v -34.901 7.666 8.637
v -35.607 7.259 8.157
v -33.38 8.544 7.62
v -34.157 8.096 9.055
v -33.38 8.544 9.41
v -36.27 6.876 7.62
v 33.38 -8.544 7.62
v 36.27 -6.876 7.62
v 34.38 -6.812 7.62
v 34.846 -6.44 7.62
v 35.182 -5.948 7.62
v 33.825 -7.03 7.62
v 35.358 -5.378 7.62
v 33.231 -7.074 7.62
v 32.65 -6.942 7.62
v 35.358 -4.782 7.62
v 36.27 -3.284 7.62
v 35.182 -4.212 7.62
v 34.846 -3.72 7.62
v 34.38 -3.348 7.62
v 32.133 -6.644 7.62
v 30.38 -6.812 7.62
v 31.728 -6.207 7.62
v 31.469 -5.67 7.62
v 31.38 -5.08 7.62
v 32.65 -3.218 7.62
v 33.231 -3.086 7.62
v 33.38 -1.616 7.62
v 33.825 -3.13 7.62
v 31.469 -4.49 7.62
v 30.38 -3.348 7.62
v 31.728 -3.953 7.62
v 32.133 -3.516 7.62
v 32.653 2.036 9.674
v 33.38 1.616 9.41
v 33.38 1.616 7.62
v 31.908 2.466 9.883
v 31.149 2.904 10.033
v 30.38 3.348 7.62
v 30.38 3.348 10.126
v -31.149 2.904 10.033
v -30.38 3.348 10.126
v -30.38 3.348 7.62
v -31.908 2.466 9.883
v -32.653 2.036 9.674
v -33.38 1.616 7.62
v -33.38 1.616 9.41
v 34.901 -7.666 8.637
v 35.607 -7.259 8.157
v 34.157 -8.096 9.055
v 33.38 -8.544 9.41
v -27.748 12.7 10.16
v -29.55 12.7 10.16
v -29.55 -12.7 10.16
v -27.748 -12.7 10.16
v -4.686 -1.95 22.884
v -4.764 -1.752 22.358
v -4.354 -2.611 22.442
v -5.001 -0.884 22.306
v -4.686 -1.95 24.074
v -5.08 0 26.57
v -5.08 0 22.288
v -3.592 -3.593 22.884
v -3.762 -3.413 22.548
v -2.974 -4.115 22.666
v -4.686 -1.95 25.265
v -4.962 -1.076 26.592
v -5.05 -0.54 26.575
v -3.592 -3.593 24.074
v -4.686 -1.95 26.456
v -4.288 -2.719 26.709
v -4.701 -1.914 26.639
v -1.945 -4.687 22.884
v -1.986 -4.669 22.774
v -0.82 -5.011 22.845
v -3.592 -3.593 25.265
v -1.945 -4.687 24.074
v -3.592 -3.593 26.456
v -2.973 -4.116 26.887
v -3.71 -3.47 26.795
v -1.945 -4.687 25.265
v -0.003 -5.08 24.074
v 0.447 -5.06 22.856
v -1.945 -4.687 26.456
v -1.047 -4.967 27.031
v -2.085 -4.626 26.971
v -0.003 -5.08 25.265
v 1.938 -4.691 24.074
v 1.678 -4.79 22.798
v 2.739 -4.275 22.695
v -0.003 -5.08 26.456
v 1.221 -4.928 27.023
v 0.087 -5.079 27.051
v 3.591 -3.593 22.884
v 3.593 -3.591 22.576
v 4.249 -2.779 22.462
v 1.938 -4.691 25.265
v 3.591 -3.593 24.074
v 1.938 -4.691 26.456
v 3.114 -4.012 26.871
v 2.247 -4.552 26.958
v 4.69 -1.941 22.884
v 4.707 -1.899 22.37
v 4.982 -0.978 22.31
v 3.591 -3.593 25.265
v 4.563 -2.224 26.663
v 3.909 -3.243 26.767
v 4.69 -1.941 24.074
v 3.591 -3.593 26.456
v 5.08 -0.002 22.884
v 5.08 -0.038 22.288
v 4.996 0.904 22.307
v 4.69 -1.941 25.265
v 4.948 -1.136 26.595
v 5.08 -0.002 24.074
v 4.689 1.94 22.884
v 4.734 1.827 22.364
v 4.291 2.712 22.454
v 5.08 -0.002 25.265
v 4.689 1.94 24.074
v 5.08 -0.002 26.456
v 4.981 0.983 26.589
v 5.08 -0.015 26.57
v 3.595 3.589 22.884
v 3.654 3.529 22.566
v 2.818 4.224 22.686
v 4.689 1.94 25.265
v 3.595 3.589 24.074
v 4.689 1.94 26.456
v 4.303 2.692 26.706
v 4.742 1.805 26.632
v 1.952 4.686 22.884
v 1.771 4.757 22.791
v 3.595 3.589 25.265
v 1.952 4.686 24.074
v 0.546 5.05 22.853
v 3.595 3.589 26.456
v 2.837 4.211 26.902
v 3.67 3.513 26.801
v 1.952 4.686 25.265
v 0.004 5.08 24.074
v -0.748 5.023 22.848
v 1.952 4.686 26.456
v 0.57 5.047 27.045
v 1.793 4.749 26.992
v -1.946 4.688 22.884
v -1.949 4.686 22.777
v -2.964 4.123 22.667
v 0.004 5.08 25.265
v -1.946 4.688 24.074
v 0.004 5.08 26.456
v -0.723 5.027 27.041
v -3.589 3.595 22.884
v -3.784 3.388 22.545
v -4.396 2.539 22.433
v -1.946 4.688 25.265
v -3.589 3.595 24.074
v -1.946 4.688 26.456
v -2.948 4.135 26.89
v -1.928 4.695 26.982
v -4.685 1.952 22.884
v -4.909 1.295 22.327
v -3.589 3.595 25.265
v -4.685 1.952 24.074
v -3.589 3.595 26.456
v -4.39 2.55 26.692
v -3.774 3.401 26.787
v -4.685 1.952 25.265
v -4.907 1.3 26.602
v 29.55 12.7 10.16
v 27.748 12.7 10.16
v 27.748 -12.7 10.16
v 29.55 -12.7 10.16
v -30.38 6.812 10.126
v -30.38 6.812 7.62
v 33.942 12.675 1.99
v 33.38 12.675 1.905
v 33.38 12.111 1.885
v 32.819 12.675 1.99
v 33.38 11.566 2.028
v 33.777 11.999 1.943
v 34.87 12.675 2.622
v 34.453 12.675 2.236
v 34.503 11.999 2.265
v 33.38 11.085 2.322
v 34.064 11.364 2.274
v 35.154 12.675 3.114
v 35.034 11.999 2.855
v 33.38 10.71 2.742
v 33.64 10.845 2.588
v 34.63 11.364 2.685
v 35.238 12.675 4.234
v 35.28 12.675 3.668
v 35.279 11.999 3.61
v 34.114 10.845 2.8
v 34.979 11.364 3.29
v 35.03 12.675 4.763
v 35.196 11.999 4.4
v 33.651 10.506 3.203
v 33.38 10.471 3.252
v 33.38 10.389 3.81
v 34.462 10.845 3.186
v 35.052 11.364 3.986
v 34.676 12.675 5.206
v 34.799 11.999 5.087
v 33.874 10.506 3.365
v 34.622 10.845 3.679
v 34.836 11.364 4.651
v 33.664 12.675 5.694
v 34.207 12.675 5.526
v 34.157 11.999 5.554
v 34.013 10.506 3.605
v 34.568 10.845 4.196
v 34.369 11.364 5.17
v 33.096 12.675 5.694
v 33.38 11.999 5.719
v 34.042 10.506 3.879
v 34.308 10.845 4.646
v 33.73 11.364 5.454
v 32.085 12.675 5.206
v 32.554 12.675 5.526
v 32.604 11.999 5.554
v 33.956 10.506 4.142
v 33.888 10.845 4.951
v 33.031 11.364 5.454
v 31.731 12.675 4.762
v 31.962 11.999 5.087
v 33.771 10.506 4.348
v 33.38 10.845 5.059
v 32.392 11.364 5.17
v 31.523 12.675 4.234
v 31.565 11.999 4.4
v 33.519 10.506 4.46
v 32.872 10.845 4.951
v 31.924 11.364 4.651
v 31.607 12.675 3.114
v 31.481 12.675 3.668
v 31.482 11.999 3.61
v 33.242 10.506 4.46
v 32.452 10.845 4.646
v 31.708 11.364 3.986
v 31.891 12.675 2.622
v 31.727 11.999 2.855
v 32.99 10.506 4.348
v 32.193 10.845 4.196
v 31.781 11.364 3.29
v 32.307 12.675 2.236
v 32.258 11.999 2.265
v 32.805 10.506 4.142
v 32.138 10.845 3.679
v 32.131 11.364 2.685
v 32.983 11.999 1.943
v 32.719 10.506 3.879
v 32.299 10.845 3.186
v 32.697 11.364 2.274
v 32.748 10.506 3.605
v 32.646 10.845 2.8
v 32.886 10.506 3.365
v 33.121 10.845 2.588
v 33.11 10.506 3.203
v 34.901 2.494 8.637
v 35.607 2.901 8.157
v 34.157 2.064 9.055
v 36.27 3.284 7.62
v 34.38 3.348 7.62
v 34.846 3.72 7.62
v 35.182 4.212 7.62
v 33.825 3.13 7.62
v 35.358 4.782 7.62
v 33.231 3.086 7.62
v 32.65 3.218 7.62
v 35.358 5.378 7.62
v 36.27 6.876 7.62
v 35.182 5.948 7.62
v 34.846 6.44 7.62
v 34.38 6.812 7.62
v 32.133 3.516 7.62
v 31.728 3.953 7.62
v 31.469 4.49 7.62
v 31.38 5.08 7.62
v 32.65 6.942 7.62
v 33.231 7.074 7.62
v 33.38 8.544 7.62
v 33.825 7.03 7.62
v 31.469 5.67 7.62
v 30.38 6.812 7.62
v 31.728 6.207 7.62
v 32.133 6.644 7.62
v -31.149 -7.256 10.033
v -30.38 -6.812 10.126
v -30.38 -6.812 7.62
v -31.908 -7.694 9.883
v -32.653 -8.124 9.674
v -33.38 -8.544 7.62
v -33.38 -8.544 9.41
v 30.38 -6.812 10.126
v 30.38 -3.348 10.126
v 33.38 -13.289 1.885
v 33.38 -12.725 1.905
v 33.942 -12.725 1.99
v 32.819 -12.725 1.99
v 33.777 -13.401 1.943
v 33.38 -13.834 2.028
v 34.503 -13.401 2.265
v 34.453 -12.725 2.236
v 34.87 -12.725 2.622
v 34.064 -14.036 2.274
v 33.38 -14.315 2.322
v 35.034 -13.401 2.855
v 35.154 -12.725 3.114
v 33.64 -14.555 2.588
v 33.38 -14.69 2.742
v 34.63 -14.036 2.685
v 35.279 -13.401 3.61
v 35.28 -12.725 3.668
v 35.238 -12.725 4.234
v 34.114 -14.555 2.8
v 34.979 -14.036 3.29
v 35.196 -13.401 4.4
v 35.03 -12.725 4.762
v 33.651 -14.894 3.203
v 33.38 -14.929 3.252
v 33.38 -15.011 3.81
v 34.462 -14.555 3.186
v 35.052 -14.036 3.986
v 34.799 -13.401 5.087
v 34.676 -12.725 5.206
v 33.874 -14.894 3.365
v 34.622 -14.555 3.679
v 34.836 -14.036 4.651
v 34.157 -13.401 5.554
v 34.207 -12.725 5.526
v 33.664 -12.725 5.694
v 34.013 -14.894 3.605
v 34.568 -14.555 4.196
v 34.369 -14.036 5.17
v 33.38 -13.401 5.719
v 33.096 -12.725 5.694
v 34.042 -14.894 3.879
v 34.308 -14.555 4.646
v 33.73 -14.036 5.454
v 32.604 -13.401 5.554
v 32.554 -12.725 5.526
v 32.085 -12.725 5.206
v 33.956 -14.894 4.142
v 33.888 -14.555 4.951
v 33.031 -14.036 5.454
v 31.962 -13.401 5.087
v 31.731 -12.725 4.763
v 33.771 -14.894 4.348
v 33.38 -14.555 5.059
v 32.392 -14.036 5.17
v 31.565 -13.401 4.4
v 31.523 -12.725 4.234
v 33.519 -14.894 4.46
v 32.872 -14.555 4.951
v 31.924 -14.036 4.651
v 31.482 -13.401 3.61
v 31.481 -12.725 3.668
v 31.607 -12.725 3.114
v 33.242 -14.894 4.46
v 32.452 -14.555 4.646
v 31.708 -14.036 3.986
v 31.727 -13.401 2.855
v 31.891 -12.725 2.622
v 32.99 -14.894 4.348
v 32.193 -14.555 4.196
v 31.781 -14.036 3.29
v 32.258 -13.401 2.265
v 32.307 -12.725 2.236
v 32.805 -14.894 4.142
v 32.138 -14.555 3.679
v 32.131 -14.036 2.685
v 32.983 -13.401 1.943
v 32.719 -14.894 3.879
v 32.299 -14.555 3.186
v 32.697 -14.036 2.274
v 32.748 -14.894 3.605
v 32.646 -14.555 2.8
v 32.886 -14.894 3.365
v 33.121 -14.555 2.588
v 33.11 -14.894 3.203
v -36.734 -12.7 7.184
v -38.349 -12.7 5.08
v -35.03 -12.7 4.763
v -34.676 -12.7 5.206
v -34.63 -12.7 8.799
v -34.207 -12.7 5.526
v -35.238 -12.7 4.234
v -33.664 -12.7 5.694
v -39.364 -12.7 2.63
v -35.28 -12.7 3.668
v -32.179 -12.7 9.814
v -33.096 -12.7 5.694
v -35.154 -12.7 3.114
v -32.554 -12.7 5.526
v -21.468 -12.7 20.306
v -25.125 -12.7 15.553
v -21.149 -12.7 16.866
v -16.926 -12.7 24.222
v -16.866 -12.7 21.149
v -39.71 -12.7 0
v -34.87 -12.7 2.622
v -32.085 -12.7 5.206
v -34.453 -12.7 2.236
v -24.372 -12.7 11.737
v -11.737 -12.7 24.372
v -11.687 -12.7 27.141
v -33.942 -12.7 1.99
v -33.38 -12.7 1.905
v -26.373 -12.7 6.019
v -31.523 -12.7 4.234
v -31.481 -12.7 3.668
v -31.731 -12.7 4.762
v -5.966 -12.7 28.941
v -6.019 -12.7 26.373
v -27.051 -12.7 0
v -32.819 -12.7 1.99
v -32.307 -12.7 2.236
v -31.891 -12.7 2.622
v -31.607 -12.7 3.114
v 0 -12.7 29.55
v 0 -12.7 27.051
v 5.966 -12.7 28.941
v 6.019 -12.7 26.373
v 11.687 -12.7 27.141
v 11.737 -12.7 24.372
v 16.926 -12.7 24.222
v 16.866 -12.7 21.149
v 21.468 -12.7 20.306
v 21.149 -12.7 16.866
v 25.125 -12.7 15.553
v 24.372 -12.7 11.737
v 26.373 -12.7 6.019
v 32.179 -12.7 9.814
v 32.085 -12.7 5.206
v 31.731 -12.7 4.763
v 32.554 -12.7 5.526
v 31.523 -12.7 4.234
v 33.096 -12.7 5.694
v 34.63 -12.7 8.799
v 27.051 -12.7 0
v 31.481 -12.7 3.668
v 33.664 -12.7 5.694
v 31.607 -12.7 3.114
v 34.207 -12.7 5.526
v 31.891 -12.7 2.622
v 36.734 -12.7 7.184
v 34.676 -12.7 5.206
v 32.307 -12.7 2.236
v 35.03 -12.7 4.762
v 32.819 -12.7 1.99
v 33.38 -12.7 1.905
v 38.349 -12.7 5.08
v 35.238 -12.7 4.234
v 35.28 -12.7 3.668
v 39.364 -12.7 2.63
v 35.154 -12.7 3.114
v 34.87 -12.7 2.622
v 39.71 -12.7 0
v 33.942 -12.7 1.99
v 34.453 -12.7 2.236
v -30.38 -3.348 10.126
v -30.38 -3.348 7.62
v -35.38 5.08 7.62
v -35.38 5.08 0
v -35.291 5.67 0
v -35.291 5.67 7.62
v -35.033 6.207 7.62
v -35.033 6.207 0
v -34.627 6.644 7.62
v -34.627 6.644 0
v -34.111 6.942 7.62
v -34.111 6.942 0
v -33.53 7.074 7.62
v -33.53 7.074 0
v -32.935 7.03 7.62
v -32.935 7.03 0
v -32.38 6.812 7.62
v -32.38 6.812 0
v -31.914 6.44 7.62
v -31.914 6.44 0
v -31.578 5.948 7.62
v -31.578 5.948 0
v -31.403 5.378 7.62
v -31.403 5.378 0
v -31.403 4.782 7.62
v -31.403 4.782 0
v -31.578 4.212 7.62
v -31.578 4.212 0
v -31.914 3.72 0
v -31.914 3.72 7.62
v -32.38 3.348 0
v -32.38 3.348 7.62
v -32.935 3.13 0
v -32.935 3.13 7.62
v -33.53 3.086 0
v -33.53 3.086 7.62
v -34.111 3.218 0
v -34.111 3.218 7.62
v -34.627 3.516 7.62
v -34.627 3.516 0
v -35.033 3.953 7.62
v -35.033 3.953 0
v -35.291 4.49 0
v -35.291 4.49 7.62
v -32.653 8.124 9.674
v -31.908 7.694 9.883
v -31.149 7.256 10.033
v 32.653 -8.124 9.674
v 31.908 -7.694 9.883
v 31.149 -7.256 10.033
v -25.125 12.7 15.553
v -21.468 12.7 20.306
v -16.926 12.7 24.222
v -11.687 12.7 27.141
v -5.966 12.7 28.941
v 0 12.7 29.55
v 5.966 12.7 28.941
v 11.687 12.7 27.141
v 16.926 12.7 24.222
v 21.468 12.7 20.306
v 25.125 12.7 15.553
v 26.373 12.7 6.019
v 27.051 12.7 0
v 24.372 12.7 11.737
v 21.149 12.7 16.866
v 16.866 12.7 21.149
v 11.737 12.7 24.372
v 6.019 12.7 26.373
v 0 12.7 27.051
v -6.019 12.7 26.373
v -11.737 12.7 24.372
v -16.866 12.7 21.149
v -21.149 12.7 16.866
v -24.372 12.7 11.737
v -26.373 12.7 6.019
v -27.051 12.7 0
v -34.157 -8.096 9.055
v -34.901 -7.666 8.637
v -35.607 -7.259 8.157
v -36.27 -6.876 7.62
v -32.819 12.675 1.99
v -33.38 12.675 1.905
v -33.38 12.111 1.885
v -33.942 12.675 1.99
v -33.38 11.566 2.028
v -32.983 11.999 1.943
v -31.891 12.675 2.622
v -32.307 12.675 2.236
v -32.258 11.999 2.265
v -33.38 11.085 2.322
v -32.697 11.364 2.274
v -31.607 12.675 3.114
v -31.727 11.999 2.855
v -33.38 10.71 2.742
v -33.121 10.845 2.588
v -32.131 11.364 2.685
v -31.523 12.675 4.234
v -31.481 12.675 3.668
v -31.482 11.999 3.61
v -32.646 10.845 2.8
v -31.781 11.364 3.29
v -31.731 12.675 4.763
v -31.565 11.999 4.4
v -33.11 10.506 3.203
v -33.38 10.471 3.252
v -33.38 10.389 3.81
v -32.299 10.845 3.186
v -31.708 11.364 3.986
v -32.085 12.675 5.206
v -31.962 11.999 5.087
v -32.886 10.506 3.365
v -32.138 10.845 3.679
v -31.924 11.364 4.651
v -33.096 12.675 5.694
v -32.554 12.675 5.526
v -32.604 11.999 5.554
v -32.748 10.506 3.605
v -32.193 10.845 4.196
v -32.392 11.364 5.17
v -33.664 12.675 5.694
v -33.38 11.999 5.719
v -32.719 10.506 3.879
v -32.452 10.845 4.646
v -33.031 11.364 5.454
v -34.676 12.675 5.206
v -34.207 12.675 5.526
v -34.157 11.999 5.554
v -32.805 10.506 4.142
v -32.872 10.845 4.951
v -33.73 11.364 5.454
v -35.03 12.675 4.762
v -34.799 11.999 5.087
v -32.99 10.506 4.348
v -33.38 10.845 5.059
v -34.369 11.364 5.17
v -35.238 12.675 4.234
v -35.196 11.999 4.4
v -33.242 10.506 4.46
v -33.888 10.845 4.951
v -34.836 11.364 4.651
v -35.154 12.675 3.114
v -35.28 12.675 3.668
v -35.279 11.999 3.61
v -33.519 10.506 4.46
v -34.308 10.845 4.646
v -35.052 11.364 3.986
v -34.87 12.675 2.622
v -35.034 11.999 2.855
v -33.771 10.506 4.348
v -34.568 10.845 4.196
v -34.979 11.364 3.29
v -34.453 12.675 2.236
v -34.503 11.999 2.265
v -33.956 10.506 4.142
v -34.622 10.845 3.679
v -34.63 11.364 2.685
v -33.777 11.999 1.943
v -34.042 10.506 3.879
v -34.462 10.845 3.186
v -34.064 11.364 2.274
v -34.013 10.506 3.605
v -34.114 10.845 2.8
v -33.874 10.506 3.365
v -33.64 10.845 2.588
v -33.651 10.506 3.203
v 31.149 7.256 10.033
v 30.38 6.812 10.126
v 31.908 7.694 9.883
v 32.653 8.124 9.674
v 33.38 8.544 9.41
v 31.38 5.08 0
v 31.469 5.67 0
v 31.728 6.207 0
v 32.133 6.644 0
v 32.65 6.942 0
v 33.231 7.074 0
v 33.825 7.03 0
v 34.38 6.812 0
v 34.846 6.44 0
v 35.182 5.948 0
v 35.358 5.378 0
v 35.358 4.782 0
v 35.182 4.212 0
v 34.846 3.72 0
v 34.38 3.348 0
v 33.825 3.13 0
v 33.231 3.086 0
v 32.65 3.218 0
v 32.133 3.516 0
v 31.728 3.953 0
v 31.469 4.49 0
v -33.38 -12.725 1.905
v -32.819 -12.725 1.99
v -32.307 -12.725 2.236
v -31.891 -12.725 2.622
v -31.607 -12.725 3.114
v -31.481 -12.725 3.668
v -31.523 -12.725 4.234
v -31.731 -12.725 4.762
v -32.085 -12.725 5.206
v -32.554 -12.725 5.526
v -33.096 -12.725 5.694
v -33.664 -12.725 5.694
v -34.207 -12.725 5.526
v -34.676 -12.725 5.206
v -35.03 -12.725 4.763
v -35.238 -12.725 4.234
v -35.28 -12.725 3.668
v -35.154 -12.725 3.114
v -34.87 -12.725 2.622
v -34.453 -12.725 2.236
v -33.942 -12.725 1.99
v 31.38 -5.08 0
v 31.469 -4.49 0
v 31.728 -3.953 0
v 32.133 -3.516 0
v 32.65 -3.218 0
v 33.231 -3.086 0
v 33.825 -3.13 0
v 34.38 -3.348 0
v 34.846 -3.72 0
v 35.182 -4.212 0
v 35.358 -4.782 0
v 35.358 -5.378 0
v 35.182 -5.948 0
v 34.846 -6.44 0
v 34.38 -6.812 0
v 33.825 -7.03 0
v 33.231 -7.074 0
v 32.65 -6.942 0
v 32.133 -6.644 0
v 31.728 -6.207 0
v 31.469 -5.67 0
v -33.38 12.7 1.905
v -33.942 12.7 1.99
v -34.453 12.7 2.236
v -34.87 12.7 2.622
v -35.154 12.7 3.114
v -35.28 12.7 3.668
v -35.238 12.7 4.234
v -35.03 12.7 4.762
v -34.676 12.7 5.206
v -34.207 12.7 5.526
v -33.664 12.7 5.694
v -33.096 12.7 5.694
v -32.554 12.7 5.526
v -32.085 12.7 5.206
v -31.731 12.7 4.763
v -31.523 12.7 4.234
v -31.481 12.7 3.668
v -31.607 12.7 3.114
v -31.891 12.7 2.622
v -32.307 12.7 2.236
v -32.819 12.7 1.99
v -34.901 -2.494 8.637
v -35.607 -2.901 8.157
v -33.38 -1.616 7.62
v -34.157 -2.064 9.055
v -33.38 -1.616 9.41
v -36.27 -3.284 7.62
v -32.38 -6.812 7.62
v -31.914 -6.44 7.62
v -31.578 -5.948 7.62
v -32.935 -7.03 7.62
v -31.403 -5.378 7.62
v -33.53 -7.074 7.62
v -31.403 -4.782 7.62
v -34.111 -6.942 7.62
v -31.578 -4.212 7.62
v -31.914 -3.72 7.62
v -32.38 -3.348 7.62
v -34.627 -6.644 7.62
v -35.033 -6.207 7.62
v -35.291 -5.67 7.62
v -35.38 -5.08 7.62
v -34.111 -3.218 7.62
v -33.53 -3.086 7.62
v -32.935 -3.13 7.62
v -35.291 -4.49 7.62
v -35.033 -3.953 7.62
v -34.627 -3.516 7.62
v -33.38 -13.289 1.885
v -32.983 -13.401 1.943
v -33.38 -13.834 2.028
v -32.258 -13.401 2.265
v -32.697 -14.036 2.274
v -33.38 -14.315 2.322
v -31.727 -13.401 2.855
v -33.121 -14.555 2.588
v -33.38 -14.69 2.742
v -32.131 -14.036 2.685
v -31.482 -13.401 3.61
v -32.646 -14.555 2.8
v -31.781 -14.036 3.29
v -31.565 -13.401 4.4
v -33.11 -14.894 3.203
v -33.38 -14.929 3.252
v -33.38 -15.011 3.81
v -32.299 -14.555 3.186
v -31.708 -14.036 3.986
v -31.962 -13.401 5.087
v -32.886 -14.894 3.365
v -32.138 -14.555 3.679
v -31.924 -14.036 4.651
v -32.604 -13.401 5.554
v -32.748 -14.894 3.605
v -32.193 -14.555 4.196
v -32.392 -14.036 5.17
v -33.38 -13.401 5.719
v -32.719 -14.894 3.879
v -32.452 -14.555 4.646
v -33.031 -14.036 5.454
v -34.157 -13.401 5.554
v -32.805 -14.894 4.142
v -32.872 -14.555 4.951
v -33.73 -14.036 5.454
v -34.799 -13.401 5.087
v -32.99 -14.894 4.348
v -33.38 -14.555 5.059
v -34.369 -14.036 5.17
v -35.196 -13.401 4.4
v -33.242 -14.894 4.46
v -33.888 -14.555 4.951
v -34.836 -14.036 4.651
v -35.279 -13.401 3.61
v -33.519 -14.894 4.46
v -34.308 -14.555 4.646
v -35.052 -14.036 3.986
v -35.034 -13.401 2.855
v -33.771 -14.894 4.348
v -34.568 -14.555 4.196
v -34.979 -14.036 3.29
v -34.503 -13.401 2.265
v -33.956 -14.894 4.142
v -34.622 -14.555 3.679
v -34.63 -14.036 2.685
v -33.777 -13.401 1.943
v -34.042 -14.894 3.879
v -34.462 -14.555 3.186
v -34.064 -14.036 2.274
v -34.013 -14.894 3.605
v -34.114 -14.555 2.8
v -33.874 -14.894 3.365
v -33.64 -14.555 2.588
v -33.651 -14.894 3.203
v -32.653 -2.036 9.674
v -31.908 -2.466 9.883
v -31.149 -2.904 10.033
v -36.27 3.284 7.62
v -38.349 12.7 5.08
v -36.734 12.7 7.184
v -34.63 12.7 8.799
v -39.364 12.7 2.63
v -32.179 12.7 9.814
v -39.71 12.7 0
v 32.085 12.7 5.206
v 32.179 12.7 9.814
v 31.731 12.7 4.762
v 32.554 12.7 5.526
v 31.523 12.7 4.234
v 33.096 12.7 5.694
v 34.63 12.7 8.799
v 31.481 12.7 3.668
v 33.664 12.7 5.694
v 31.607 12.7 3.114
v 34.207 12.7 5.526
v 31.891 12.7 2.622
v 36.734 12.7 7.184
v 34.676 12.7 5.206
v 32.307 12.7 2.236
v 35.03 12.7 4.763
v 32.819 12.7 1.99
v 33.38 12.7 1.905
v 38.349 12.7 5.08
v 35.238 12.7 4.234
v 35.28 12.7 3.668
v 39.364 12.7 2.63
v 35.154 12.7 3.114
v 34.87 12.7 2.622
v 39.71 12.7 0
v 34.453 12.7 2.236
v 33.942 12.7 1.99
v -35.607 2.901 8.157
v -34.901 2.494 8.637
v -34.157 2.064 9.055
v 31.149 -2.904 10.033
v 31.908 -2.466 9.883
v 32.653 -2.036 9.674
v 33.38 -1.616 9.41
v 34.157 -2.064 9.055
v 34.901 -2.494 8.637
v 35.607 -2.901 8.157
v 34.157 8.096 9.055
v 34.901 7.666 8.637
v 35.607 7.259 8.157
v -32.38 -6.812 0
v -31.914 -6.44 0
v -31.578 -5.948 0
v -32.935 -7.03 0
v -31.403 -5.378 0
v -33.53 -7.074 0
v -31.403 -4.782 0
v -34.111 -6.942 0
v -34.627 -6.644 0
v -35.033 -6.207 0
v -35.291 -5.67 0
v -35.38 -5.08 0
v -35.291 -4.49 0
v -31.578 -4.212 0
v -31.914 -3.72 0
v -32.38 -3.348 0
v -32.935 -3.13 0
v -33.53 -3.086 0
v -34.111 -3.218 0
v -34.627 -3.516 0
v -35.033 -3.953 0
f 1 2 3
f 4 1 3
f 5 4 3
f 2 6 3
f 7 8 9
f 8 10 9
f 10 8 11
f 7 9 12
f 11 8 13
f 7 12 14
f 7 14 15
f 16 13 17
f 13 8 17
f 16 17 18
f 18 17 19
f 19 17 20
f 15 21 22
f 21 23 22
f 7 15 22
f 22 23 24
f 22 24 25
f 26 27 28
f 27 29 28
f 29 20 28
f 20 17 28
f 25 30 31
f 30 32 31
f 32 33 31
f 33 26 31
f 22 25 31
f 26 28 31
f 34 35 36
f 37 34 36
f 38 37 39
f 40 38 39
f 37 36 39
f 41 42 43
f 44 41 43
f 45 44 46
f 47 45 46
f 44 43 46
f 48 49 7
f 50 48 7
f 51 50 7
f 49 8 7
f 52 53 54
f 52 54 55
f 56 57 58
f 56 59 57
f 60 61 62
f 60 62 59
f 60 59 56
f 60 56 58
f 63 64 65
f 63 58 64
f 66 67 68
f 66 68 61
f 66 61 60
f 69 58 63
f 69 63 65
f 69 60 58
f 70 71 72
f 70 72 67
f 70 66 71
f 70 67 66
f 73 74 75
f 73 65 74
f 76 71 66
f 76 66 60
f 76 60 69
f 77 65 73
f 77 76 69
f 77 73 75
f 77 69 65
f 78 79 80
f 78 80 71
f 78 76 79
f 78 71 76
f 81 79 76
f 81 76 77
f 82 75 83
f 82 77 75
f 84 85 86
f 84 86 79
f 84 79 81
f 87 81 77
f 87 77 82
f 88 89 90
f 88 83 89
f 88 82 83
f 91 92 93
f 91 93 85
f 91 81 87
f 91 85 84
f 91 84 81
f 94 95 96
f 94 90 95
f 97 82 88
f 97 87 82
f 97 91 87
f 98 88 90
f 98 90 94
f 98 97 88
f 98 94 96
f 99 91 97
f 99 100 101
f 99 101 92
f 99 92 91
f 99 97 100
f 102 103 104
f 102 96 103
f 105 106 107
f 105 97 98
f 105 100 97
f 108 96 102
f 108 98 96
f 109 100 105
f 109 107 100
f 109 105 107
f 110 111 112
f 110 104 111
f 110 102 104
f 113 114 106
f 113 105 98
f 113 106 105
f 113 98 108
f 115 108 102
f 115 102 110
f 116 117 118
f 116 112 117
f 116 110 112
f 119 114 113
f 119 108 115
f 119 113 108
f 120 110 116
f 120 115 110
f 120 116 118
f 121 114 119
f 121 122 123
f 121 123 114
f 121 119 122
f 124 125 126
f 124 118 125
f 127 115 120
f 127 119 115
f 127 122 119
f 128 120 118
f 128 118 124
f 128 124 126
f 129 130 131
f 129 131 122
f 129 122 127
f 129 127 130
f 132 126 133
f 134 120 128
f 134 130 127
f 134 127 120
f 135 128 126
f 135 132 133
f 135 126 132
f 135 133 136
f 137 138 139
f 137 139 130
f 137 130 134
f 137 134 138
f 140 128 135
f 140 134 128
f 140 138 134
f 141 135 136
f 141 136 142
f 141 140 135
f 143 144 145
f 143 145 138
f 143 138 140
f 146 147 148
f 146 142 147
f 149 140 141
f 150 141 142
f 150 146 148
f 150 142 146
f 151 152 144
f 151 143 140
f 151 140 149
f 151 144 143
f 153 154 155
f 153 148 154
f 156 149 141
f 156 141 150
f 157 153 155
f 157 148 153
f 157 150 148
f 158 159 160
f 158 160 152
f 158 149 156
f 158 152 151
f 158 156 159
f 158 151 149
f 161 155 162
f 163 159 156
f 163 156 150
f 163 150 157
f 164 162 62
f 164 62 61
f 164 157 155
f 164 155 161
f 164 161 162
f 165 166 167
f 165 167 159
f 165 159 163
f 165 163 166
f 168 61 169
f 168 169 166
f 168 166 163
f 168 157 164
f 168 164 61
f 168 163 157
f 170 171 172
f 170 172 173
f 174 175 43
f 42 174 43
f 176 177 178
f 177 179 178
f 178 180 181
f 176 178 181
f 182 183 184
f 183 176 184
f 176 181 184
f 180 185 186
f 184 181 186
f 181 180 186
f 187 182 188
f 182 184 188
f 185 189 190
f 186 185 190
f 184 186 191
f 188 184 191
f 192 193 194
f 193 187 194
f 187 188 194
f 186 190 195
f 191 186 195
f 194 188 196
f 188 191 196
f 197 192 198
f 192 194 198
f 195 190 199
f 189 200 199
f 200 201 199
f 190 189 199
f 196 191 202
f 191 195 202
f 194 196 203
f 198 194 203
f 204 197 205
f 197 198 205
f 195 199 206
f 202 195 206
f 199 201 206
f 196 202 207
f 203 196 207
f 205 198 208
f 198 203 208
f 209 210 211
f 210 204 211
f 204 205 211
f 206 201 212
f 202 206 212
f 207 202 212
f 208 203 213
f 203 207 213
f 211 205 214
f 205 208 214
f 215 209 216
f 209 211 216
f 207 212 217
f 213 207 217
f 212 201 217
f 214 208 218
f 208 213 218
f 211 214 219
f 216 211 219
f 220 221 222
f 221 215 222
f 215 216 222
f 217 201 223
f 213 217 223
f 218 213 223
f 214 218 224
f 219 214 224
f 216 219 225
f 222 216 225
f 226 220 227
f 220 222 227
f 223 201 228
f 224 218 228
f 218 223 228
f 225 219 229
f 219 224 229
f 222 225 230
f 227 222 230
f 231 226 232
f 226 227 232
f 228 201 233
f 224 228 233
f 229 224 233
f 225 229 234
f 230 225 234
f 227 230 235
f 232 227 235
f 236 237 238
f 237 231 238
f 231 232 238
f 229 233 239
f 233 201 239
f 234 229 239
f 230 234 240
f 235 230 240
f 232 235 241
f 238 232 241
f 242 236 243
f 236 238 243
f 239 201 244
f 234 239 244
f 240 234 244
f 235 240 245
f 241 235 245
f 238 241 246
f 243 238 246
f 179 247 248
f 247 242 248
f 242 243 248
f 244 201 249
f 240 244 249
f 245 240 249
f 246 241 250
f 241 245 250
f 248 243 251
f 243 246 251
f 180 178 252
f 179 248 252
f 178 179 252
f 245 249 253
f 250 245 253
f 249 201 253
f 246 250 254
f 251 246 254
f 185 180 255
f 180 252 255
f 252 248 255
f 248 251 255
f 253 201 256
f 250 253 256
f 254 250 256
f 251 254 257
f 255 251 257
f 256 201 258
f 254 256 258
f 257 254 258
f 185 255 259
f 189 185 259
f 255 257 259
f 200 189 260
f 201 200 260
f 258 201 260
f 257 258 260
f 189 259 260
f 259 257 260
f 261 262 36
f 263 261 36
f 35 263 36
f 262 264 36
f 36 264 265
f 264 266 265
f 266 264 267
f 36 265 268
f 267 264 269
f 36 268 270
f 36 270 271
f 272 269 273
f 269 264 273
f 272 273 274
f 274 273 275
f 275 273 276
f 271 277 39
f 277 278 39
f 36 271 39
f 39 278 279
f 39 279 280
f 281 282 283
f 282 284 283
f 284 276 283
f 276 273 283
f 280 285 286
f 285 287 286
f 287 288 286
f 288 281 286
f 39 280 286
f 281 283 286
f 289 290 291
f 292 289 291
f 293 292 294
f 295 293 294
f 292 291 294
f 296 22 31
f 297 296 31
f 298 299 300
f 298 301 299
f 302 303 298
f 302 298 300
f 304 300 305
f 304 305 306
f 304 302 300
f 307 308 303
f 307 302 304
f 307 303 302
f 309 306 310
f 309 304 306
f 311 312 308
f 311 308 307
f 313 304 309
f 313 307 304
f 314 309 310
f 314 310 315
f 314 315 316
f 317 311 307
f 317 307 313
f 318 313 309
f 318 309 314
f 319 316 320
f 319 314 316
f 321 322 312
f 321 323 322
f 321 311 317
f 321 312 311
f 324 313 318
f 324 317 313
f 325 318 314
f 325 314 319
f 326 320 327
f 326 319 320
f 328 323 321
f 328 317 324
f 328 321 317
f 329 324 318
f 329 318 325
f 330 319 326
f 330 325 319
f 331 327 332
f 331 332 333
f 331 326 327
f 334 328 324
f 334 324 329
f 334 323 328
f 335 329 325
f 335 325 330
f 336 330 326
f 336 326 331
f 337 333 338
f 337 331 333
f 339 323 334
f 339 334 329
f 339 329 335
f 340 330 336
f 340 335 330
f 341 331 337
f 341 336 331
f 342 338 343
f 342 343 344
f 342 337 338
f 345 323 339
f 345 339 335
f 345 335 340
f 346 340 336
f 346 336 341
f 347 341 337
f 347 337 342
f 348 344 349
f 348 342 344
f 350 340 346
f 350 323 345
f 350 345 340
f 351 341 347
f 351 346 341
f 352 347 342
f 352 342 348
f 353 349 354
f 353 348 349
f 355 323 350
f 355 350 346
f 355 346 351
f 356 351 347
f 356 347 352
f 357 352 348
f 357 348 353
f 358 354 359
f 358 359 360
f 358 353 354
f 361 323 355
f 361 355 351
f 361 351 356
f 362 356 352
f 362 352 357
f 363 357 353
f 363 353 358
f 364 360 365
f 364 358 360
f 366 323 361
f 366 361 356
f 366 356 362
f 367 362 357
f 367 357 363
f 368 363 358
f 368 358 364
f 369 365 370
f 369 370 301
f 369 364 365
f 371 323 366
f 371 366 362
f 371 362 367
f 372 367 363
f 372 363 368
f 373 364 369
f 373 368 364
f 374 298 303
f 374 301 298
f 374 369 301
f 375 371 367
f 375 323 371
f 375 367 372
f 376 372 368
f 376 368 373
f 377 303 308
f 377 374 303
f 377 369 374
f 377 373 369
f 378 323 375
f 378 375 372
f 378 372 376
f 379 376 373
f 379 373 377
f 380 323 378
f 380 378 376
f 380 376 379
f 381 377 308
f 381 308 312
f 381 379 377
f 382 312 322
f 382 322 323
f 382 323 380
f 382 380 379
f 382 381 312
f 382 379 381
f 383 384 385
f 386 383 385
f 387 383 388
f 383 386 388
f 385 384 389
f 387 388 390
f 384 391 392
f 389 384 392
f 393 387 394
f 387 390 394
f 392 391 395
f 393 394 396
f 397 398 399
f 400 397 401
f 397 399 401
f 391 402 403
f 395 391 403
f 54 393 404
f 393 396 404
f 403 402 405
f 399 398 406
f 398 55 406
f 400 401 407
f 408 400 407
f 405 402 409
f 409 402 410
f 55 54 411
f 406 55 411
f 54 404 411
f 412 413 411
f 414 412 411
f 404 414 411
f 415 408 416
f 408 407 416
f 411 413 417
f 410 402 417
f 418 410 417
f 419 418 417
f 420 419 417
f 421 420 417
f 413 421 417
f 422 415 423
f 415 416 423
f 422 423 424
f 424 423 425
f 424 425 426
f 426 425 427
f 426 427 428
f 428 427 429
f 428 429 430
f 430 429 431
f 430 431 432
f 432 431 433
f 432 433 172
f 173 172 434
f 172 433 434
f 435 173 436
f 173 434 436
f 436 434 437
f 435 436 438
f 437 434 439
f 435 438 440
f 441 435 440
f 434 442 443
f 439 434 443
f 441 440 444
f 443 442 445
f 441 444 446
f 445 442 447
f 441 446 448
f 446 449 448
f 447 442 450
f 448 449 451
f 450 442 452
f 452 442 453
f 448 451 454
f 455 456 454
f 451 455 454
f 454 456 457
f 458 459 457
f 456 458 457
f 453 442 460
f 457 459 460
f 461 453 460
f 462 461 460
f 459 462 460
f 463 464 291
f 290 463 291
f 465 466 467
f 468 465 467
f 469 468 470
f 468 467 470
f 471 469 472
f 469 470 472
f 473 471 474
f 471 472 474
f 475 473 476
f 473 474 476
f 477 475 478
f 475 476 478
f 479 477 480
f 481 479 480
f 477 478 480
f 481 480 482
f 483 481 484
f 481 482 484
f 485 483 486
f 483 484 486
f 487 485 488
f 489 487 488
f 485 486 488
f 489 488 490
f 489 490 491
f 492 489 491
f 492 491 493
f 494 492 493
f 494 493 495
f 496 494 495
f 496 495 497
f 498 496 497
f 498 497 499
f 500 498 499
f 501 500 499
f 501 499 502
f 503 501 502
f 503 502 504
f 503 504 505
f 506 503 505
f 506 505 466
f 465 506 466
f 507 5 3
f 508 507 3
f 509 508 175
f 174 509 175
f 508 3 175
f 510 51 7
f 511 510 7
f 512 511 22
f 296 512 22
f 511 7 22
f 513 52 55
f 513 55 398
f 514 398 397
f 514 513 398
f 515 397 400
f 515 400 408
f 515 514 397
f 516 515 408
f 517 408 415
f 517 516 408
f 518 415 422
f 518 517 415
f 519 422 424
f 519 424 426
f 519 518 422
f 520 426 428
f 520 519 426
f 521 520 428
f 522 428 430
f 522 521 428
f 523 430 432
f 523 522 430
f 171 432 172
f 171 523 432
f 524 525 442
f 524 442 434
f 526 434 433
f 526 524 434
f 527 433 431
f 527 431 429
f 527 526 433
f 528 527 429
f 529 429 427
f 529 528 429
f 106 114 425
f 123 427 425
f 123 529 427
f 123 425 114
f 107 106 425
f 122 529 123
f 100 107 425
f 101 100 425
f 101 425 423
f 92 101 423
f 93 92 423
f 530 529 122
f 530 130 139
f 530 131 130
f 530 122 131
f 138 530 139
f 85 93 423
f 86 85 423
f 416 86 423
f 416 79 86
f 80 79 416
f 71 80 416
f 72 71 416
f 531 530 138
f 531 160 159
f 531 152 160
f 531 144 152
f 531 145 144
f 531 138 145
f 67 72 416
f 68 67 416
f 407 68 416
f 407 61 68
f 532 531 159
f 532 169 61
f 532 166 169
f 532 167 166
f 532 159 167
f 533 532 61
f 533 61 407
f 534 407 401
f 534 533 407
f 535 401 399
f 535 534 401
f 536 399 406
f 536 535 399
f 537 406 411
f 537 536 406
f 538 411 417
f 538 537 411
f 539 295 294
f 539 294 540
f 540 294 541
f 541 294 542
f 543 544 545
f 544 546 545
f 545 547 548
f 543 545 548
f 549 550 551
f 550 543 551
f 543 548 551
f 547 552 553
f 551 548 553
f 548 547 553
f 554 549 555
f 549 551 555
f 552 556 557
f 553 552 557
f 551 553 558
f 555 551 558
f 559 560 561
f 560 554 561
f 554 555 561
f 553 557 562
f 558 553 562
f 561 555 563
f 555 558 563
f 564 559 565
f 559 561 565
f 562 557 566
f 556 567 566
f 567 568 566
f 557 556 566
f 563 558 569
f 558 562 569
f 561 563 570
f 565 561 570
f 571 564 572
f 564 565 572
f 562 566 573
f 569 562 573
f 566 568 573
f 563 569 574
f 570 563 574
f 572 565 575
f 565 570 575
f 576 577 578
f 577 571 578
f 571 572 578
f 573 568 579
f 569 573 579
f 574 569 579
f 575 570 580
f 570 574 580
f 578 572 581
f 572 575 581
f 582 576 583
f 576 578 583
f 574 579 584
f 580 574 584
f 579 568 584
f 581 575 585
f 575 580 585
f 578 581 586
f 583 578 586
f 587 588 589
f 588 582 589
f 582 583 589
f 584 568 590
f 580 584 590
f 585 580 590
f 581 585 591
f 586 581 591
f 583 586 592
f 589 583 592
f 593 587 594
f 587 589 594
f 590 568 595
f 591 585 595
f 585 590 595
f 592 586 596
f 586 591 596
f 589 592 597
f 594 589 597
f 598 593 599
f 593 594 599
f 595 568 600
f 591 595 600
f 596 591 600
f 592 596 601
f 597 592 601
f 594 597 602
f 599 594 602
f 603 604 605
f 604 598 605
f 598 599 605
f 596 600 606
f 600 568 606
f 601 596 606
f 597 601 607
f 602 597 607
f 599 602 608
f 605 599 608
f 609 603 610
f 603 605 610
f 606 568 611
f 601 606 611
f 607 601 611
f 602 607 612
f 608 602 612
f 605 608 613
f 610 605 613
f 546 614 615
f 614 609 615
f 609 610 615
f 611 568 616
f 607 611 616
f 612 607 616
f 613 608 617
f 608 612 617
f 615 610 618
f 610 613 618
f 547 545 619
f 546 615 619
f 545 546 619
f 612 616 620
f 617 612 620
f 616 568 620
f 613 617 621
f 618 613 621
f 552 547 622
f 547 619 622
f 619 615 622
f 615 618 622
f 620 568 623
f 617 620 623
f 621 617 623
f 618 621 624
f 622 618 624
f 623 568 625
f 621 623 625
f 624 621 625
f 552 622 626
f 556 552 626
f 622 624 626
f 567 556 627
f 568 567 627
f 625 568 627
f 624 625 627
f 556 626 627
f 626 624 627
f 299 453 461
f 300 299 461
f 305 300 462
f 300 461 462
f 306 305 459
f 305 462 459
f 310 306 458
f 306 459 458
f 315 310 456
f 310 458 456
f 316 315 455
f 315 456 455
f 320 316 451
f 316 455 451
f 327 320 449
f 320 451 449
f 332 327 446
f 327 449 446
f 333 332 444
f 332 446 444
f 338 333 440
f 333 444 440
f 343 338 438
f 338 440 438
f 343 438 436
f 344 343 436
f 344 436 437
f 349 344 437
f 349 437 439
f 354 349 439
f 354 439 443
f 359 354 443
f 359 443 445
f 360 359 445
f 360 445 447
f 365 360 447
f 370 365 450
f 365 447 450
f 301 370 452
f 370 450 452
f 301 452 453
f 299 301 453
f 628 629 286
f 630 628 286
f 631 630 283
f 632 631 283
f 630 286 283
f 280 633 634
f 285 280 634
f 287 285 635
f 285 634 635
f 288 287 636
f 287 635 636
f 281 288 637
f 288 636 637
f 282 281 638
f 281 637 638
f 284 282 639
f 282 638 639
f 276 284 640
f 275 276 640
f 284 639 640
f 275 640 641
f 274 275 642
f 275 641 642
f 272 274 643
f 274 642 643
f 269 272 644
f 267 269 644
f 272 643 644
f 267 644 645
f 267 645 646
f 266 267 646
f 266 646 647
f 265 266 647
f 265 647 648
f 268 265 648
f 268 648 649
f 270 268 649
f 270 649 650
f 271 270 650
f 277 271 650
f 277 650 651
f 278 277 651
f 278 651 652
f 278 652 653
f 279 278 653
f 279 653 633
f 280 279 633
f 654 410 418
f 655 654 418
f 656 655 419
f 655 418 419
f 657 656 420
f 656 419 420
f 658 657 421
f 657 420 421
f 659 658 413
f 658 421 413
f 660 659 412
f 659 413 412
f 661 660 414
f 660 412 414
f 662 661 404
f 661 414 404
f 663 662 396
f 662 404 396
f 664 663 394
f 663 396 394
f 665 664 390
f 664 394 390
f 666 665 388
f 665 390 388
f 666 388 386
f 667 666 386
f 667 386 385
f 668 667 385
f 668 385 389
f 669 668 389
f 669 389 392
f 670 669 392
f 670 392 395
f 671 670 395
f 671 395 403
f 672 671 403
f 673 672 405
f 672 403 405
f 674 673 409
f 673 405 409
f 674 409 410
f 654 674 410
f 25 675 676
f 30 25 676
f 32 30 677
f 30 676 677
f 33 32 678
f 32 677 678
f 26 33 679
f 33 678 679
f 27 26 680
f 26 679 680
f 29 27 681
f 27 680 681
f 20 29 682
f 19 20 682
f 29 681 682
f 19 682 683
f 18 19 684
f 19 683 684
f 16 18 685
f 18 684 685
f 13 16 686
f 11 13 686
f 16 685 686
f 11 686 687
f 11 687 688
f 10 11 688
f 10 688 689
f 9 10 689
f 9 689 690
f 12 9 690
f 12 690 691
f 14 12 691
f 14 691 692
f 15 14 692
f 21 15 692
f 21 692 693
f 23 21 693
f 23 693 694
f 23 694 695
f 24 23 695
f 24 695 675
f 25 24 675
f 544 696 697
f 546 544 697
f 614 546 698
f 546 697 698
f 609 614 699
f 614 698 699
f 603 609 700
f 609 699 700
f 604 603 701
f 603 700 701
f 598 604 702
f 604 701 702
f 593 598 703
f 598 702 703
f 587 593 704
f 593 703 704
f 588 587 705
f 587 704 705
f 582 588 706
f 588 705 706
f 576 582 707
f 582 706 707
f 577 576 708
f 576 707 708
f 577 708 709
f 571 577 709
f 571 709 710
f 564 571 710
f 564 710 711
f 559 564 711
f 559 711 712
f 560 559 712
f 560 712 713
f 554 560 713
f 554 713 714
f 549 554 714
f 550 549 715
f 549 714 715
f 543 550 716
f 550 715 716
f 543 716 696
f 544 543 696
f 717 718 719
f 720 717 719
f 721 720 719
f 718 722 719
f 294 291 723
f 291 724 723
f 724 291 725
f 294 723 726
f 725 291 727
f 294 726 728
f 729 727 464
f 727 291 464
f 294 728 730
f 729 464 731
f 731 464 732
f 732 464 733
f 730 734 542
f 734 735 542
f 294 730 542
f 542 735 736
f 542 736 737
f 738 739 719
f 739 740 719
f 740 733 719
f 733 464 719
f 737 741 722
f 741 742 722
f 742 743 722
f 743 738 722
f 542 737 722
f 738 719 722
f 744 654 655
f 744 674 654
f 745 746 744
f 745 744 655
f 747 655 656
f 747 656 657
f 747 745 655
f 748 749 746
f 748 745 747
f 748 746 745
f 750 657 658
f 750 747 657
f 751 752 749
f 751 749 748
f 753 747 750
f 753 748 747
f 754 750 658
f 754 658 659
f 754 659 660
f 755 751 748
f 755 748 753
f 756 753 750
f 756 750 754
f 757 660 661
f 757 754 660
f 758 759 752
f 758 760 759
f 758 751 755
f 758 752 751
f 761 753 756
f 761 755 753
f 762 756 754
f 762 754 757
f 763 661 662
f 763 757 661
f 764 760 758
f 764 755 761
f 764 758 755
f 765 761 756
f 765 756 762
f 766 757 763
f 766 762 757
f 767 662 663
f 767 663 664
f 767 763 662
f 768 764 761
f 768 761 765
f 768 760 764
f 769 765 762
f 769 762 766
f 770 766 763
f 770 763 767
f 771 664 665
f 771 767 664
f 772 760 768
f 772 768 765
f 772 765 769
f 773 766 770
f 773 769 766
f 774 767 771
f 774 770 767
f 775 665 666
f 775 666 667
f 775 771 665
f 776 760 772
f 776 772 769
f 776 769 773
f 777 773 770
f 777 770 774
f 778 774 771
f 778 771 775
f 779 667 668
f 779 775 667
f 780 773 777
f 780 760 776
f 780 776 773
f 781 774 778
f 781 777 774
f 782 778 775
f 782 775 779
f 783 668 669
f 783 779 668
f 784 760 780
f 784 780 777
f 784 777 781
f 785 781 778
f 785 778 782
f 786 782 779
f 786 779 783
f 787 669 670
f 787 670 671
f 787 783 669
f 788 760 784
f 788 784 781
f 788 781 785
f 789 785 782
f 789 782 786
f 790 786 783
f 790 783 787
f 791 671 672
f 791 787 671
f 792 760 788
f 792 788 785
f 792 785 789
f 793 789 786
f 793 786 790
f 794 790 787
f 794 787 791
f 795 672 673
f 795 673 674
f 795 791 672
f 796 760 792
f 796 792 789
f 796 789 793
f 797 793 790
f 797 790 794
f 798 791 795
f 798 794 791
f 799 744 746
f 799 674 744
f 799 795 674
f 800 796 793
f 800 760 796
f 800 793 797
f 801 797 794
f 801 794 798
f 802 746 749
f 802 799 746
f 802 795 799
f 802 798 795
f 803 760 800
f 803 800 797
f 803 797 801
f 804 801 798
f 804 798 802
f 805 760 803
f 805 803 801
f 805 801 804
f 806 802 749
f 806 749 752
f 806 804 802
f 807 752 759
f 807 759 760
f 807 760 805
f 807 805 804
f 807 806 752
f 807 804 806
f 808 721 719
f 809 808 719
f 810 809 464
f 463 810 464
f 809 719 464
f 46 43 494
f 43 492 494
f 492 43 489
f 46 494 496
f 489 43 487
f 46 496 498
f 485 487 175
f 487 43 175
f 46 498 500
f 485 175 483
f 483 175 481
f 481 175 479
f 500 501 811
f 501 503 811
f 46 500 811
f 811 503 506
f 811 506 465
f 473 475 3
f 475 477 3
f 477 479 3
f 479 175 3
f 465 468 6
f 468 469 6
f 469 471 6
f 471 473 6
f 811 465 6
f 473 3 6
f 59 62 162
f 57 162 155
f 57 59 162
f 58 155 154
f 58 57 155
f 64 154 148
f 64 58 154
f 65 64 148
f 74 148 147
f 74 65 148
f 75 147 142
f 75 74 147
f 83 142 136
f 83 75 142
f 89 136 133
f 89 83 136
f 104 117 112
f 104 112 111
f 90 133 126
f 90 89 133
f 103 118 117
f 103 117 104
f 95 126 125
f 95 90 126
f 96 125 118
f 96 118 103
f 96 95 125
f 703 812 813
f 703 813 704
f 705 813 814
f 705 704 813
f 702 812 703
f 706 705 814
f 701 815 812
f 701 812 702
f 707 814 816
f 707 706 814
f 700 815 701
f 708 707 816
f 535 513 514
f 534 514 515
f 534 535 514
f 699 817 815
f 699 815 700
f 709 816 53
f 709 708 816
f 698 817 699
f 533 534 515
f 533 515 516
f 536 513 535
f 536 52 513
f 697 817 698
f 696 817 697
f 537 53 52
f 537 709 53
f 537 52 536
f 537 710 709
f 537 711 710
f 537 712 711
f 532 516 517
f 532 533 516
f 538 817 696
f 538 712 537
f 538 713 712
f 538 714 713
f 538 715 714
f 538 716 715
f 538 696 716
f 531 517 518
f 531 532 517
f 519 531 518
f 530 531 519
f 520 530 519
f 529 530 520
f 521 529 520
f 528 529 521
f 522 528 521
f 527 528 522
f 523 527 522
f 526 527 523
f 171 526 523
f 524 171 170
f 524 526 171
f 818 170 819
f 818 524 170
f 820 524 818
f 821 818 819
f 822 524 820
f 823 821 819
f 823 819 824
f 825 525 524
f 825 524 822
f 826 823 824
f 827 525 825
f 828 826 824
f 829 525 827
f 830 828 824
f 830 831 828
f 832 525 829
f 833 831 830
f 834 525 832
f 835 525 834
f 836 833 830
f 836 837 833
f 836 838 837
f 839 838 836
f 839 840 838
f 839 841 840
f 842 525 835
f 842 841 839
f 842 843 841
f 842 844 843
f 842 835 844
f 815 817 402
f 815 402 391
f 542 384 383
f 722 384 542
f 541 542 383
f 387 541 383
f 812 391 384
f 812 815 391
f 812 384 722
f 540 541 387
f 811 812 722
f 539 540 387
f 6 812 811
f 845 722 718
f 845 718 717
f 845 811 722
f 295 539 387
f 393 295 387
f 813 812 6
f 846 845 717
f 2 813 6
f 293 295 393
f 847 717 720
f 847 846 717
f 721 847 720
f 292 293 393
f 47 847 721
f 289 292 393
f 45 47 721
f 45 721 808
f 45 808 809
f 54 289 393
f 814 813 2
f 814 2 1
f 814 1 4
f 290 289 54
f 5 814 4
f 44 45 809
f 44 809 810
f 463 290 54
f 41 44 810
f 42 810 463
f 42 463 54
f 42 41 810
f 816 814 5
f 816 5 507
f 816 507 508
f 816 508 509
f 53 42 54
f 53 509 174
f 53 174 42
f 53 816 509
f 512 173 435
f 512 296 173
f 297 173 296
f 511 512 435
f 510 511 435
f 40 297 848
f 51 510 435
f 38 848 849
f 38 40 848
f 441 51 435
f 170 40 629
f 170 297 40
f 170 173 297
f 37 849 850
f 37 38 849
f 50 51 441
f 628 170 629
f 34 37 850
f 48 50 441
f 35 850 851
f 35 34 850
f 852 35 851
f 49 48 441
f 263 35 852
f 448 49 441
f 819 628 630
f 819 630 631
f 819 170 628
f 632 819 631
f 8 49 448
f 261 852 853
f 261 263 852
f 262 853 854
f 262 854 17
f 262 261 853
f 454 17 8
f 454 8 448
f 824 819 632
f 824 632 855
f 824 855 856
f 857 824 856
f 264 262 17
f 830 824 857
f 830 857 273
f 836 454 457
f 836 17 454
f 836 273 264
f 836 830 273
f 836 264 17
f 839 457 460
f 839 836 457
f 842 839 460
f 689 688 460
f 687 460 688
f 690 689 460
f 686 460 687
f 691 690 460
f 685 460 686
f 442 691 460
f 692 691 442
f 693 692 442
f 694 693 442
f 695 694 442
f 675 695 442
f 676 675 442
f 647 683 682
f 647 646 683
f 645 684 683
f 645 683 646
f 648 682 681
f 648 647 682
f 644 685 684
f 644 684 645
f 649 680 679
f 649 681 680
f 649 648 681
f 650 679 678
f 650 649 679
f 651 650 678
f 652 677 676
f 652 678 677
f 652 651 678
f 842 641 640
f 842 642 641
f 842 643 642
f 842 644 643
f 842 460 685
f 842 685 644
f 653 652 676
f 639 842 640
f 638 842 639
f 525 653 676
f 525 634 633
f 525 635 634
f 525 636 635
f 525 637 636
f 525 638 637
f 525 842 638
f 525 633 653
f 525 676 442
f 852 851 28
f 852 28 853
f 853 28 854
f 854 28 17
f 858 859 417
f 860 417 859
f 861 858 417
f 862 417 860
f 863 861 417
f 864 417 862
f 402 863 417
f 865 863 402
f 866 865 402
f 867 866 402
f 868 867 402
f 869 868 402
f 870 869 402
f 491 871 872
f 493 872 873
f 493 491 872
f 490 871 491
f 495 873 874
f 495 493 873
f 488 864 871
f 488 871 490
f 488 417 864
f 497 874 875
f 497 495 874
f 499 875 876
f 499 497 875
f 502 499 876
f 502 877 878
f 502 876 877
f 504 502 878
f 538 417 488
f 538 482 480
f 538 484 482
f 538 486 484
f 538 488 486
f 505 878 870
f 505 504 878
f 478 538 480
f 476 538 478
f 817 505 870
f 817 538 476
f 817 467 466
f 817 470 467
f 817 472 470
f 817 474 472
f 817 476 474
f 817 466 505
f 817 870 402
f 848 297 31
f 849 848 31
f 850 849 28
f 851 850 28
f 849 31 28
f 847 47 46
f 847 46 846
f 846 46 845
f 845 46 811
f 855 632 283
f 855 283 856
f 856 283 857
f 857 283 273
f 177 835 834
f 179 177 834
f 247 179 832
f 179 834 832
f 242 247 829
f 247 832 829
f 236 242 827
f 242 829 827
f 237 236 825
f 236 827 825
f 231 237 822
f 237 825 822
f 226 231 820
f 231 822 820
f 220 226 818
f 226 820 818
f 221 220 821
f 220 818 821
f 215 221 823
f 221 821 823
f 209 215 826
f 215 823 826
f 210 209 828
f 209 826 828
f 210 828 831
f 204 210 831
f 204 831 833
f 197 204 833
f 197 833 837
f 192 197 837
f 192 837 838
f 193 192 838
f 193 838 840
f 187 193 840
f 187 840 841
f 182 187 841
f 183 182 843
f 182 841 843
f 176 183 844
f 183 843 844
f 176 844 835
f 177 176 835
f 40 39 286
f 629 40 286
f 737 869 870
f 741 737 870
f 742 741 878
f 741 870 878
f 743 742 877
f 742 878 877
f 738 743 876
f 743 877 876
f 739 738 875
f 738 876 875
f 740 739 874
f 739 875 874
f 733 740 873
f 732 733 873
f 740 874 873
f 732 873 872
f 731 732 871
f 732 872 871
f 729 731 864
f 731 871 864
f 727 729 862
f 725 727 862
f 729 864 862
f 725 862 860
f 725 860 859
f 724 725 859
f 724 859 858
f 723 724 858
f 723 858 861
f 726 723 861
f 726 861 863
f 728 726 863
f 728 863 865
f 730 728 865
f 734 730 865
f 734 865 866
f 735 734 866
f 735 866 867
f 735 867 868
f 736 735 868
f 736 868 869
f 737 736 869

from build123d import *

# Parameters (mm, degrees)
BOSS_EXTRUDE5_DEPTH      = 12.7
BOSS_EXTRUDE5_DEPTH_BACK = 12.7
SKETCH6_R                = 2.000000064
CUT_EXTRUDE4_DEPTH       = 52.101224931
CUT_EXTRUDE5_START       = -7.62
CUT_EXTRUDE5_DEPTH       = 2.54
SKETCH9_R                = 1.905
BOSS_EXTRUDE9_DEPTH      = 0.0254
DOME3_FACE_RADIUS        = 1.905
DOME3_HEIGHT             = 2.286
DOME4_FACE_RADIUS        = 1.905
DOME4_HEIGHT             = 2.286
SKETCH10_R               = 1.905
CUT_EXTRUDE6_DEPTH       = 0.0254
DOME5_FACE_RADIUS        = 1.905
DOME5_HEIGHT             = 2.286
DOME6_FACE_RADIUS        = 1.905
DOME6_HEIGHT             = 2.286
BOSS_EXTRUDE10_START     = -28
BOSS_EXTRUDE10_DEPTH     = 9.812276711
BOSS_EXTRUDE10_START_2   = -6
BOSS_EXTRUDE10_2_DEPTH   = 12
CUT_EXTRUDE7_DEPTH       = 10.414
CUT_EXTRUDE7_DEPTH_BACK  = 10.414
SKETCH13_R               = 22.86


with BuildPart() as part:
    # Sketch3 → Boss-Extrude5 (new, two sides: drawn at the far end of the back side and taken through both)
    with BuildSketch(Plane(origin=(0, 0, 0), x_dir=(-1, 0, 0), z_dir=(0, -1, 0)).offset(-BOSS_EXTRUDE5_DEPTH_BACK)):
        with BuildLine():
            Line((27.051, 0), (29.549701049, 0))
            Line((29.549701049, 0), (39.709701049, 0))
            ThreePointArc((39.709701049, 0), (36.733905946, -7.184204897), (29.549701049, -10.16))
            Line((29.549701049, -10.16), (27.748139255, -10.16))
            ThreePointArc((27.748139255, -10.16), (0, -29.549701049), (-27.748139255, -10.16))
            Line((-27.748139255, -10.16), (-29.549701049, -10.16))
            ThreePointArc((-29.549701049, -10.16), (-36.733905946, -7.184204897), (-39.709701049, 0))
            Line((-39.709701049, 0), (-29.549701049, 0))
            Line((-29.549701049, 0), (-27.051, 0))
            ThreePointArc((-27.051, 0), (0, -27.051), (27.051, 0))
        make_face()
    extrude(amount=BOSS_EXTRUDE5_DEPTH + BOSS_EXTRUDE5_DEPTH_BACK)

    # Sketch6 → Cut-Extrude4 (cut, through all)
    with BuildSketch(Plane(origin=(0, 0, 0), x_dir=(-1, 0, 0), z_dir=(0, 0, -1))):
        with Locations((-33.380350525, 5.08)):
            Circle(SKETCH6_R)
        with Locations((-33.380350525, -5.08)):
            Circle(SKETCH6_R)
        with Locations((33.380350525, 5.08)):
            Circle(SKETCH6_R)
        with Locations((33.380350525, -5.08)):
            Circle(SKETCH6_R)
    extrude(amount=-CUT_EXTRUDE4_DEPTH, mode=Mode.SUBTRACT)

    # Sketch7 → Cut-Extrude5 (cut)
    with BuildSketch(Plane(origin=(0, 0, 0), x_dir=(-1, 0, 0), z_dir=(0, 0, -1)).offset(CUT_EXTRUDE5_START)):
        Polygon((-30.380350525, 6.812050808), (-33.380350525, 8.544101615), (-36.380350525, 6.812050808), (-36.380350525, 3.347949192), (-33.380350525, 1.615898385), (-30.380350525, 3.347949192), align=None)
        Polygon((-30.380350525, -3.347949192), (-33.380350525, -1.615898385), (-36.380350525, -3.347949192), (-36.380350525, -6.812050808), (-33.380350525, -8.544101615), (-30.380350525, -6.812050808), align=None)
        Polygon((36.380350525, 6.812050808), (33.380350525, 8.544101615), (30.380350525, 6.812050808), (30.380350525, 3.347949192), (33.380350525, 1.615898385), (36.380350525, 3.347949192), align=None)
        Polygon((36.380350525, -3.347949192), (33.380350525, -1.615898385), (30.380350525, -3.347949192), (30.380350525, -6.812050808), (33.380350525, -8.544101615), (36.380350525, -6.812050808), align=None)
    extrude(amount=-CUT_EXTRUDE5_DEPTH, mode=Mode.SUBTRACT)

    # Sketch9 → Boss-Extrude9 (add)
    with BuildSketch(Plane(origin=(0, -12.7, 0), x_dir=(-1, 0, 0), z_dir=(0, -1, 0))):
        with Locations(Location((-33.380350525, -3.81, 0), (0, 0, 90))):
            Circle(SKETCH9_R)
        with Locations(Location((33.380350525, -3.81, 0), (0, 0, 90))):
            Circle(SKETCH9_R)
    extrude(amount=BOSS_EXTRUDE9_DEPTH)

    # Dome3: a dome of height H over a round flat face of radius A is a cap of a sphere of radius (A * A + H * H) / (2 * H)
    dome3_r = (DOME3_FACE_RADIUS * DOME3_FACE_RADIUS + DOME3_HEIGHT * DOME3_HEIGHT) / (2 * DOME3_HEIGHT)
    dome3_base = Plane((33.380350525, -12.7254, 3.81), z_dir=(0, -1, 0))
    with Locations(dome3_base.offset(DOME3_HEIGHT - dome3_r)):
        dome3_ball = Sphere(dome3_r, mode=Mode.PRIVATE)
    add(split(dome3_ball, bisect_by=dome3_base, keep=Keep.TOP, mode=Mode.PRIVATE))

    # Dome4: a dome of height H over a round flat face of radius A is a cap of a sphere of radius (A * A + H * H) / (2 * H)
    dome4_r = (DOME4_FACE_RADIUS * DOME4_FACE_RADIUS + DOME4_HEIGHT * DOME4_HEIGHT) / (2 * DOME4_HEIGHT)
    dome4_base = Plane((-33.380350525, -12.7254, 3.81), z_dir=(0, -1, 0))
    with Locations(dome4_base.offset(DOME4_HEIGHT - dome4_r)):
        dome4_ball = Sphere(dome4_r, mode=Mode.PRIVATE)
    add(split(dome4_ball, bisect_by=dome4_base, keep=Keep.TOP, mode=Mode.PRIVATE))

    # Sketch10 → Cut-Extrude6 (cut)
    with BuildSketch(Plane(origin=(0, 12.7, 0), x_dir=(1, 0, 0), z_dir=(0, 1, 0))):
        with Locations(Location((33.380350525, -3.81, 0), (0, 0, 90))):
            Circle(SKETCH10_R)
        with Locations(Location((-33.380350525, -3.81, 0), (0, 0, 90))):
            Circle(SKETCH10_R)
    extrude(amount=-CUT_EXTRUDE6_DEPTH, mode=Mode.SUBTRACT)

    # Dome5: a dome of height H over a round flat face of radius A is a cap of a sphere of radius (A * A + H * H) / (2 * H)
    dome5_r = (DOME5_FACE_RADIUS * DOME5_FACE_RADIUS + DOME5_HEIGHT * DOME5_HEIGHT) / (2 * DOME5_HEIGHT)
    dome5_base = Plane((33.380350525, 12.6746, 3.81), z_dir=(0, -1, 0))
    with Locations(dome5_base.offset(DOME5_HEIGHT - dome5_r)):
        dome5_ball = Sphere(dome5_r, mode=Mode.PRIVATE)
    add(split(dome5_ball, bisect_by=dome5_base, keep=Keep.TOP, mode=Mode.PRIVATE), mode=Mode.SUBTRACT)

    # Dome6: a dome of height H over a round flat face of radius A is a cap of a sphere of radius (A * A + H * H) / (2 * H)
    dome6_r = (DOME6_FACE_RADIUS * DOME6_FACE_RADIUS + DOME6_HEIGHT * DOME6_HEIGHT) / (2 * DOME6_HEIGHT)
    dome6_base = Plane((-33.380350525, 12.6746, 3.81), z_dir=(0, -1, 0))
    with Locations(dome6_base.offset(DOME6_HEIGHT - dome6_r)):
        dome6_ball = Sphere(dome6_r, mode=Mode.PRIVATE)
    add(split(dome6_ball, bisect_by=dome6_base, keep=Keep.TOP, mode=Mode.PRIVATE), mode=Mode.SUBTRACT)

    # Boss-Extrude10: read off the stored shape, not the designer's step
    # Boss-Extrude10 outline → Boss-Extrude10 (add)
    with BuildSketch(Plane(origin=(0, 0, 0), x_dir=(-1, 0, 0), z_dir=(0, 0, -1)).offset(BOSS_EXTRUDE10_START)):
        with BuildLine():
            add(Edge.make_bspline(
                [(5.08, 0), (5.08, -1.345643562), (4.526719274, -2.65770318), (2.656649507, -4.527337736), (1.331455476, -5.079221738), (-1.32551012, -5.080776522), (-2.646103693, -4.537670622), (-4.536464951, -2.648170155), (-5.07946682, -1.329666265), (-5.080532362, 1.325589104), (-4.531084206, 2.651405113), (-2.659686169, 4.526228301), (-1.345855952, 5.079004988), (1.338333997, 5.080992228), (2.654502959, 4.528337308), (4.524460769, 2.661104937), (5.08, 1.345643562), (5.08, 0)],
                knots=[0, 0, 0, 0, 0.125, 0.125, 0.25, 0.25, 0.375, 0.375, 0.5, 0.5, 0.625, 0.625, 0.75, 0.75, 0.875, 0.875, 1, 1, 1, 1], degree=3))
        make_face()
    extrude(amount=BOSS_EXTRUDE10_DEPTH)

    # Boss-Extrude10 2 outline → Boss-Extrude10 2 (cut)
    with BuildSketch(Plane(origin=(0, 0, 0), x_dir=(1, 0, 0), z_dir=(0, 1, 0)).offset(BOSS_EXTRUDE10_START_2)):
        with BuildLine():
            Line((5.080000094, -18.187723372), (-5.080000481, -18.187723298))
            ThreePointArc((-5.080000481, -18.187723298), (-1.97e-07, -18.669), (5.080000094, -18.187723372))
        make_face()
    extrude(amount=BOSS_EXTRUDE10_2_DEPTH, mode=Mode.SUBTRACT)

    # Sketch13 → Cut-Extrude7 (cut, two sides: drawn at the far end of the back side and taken through both)
    with BuildSketch(Plane(origin=(0, 0, 0), x_dir=(1, 0, 0), z_dir=(0, 1, 0)).offset(-CUT_EXTRUDE7_DEPTH_BACK)):
        Circle(SKETCH13_R)
    extrude(amount=CUT_EXTRUDE7_DEPTH + CUT_EXTRUDE7_DEPTH_BACK, mode=Mode.SUBTRACT)


solid = part.part
